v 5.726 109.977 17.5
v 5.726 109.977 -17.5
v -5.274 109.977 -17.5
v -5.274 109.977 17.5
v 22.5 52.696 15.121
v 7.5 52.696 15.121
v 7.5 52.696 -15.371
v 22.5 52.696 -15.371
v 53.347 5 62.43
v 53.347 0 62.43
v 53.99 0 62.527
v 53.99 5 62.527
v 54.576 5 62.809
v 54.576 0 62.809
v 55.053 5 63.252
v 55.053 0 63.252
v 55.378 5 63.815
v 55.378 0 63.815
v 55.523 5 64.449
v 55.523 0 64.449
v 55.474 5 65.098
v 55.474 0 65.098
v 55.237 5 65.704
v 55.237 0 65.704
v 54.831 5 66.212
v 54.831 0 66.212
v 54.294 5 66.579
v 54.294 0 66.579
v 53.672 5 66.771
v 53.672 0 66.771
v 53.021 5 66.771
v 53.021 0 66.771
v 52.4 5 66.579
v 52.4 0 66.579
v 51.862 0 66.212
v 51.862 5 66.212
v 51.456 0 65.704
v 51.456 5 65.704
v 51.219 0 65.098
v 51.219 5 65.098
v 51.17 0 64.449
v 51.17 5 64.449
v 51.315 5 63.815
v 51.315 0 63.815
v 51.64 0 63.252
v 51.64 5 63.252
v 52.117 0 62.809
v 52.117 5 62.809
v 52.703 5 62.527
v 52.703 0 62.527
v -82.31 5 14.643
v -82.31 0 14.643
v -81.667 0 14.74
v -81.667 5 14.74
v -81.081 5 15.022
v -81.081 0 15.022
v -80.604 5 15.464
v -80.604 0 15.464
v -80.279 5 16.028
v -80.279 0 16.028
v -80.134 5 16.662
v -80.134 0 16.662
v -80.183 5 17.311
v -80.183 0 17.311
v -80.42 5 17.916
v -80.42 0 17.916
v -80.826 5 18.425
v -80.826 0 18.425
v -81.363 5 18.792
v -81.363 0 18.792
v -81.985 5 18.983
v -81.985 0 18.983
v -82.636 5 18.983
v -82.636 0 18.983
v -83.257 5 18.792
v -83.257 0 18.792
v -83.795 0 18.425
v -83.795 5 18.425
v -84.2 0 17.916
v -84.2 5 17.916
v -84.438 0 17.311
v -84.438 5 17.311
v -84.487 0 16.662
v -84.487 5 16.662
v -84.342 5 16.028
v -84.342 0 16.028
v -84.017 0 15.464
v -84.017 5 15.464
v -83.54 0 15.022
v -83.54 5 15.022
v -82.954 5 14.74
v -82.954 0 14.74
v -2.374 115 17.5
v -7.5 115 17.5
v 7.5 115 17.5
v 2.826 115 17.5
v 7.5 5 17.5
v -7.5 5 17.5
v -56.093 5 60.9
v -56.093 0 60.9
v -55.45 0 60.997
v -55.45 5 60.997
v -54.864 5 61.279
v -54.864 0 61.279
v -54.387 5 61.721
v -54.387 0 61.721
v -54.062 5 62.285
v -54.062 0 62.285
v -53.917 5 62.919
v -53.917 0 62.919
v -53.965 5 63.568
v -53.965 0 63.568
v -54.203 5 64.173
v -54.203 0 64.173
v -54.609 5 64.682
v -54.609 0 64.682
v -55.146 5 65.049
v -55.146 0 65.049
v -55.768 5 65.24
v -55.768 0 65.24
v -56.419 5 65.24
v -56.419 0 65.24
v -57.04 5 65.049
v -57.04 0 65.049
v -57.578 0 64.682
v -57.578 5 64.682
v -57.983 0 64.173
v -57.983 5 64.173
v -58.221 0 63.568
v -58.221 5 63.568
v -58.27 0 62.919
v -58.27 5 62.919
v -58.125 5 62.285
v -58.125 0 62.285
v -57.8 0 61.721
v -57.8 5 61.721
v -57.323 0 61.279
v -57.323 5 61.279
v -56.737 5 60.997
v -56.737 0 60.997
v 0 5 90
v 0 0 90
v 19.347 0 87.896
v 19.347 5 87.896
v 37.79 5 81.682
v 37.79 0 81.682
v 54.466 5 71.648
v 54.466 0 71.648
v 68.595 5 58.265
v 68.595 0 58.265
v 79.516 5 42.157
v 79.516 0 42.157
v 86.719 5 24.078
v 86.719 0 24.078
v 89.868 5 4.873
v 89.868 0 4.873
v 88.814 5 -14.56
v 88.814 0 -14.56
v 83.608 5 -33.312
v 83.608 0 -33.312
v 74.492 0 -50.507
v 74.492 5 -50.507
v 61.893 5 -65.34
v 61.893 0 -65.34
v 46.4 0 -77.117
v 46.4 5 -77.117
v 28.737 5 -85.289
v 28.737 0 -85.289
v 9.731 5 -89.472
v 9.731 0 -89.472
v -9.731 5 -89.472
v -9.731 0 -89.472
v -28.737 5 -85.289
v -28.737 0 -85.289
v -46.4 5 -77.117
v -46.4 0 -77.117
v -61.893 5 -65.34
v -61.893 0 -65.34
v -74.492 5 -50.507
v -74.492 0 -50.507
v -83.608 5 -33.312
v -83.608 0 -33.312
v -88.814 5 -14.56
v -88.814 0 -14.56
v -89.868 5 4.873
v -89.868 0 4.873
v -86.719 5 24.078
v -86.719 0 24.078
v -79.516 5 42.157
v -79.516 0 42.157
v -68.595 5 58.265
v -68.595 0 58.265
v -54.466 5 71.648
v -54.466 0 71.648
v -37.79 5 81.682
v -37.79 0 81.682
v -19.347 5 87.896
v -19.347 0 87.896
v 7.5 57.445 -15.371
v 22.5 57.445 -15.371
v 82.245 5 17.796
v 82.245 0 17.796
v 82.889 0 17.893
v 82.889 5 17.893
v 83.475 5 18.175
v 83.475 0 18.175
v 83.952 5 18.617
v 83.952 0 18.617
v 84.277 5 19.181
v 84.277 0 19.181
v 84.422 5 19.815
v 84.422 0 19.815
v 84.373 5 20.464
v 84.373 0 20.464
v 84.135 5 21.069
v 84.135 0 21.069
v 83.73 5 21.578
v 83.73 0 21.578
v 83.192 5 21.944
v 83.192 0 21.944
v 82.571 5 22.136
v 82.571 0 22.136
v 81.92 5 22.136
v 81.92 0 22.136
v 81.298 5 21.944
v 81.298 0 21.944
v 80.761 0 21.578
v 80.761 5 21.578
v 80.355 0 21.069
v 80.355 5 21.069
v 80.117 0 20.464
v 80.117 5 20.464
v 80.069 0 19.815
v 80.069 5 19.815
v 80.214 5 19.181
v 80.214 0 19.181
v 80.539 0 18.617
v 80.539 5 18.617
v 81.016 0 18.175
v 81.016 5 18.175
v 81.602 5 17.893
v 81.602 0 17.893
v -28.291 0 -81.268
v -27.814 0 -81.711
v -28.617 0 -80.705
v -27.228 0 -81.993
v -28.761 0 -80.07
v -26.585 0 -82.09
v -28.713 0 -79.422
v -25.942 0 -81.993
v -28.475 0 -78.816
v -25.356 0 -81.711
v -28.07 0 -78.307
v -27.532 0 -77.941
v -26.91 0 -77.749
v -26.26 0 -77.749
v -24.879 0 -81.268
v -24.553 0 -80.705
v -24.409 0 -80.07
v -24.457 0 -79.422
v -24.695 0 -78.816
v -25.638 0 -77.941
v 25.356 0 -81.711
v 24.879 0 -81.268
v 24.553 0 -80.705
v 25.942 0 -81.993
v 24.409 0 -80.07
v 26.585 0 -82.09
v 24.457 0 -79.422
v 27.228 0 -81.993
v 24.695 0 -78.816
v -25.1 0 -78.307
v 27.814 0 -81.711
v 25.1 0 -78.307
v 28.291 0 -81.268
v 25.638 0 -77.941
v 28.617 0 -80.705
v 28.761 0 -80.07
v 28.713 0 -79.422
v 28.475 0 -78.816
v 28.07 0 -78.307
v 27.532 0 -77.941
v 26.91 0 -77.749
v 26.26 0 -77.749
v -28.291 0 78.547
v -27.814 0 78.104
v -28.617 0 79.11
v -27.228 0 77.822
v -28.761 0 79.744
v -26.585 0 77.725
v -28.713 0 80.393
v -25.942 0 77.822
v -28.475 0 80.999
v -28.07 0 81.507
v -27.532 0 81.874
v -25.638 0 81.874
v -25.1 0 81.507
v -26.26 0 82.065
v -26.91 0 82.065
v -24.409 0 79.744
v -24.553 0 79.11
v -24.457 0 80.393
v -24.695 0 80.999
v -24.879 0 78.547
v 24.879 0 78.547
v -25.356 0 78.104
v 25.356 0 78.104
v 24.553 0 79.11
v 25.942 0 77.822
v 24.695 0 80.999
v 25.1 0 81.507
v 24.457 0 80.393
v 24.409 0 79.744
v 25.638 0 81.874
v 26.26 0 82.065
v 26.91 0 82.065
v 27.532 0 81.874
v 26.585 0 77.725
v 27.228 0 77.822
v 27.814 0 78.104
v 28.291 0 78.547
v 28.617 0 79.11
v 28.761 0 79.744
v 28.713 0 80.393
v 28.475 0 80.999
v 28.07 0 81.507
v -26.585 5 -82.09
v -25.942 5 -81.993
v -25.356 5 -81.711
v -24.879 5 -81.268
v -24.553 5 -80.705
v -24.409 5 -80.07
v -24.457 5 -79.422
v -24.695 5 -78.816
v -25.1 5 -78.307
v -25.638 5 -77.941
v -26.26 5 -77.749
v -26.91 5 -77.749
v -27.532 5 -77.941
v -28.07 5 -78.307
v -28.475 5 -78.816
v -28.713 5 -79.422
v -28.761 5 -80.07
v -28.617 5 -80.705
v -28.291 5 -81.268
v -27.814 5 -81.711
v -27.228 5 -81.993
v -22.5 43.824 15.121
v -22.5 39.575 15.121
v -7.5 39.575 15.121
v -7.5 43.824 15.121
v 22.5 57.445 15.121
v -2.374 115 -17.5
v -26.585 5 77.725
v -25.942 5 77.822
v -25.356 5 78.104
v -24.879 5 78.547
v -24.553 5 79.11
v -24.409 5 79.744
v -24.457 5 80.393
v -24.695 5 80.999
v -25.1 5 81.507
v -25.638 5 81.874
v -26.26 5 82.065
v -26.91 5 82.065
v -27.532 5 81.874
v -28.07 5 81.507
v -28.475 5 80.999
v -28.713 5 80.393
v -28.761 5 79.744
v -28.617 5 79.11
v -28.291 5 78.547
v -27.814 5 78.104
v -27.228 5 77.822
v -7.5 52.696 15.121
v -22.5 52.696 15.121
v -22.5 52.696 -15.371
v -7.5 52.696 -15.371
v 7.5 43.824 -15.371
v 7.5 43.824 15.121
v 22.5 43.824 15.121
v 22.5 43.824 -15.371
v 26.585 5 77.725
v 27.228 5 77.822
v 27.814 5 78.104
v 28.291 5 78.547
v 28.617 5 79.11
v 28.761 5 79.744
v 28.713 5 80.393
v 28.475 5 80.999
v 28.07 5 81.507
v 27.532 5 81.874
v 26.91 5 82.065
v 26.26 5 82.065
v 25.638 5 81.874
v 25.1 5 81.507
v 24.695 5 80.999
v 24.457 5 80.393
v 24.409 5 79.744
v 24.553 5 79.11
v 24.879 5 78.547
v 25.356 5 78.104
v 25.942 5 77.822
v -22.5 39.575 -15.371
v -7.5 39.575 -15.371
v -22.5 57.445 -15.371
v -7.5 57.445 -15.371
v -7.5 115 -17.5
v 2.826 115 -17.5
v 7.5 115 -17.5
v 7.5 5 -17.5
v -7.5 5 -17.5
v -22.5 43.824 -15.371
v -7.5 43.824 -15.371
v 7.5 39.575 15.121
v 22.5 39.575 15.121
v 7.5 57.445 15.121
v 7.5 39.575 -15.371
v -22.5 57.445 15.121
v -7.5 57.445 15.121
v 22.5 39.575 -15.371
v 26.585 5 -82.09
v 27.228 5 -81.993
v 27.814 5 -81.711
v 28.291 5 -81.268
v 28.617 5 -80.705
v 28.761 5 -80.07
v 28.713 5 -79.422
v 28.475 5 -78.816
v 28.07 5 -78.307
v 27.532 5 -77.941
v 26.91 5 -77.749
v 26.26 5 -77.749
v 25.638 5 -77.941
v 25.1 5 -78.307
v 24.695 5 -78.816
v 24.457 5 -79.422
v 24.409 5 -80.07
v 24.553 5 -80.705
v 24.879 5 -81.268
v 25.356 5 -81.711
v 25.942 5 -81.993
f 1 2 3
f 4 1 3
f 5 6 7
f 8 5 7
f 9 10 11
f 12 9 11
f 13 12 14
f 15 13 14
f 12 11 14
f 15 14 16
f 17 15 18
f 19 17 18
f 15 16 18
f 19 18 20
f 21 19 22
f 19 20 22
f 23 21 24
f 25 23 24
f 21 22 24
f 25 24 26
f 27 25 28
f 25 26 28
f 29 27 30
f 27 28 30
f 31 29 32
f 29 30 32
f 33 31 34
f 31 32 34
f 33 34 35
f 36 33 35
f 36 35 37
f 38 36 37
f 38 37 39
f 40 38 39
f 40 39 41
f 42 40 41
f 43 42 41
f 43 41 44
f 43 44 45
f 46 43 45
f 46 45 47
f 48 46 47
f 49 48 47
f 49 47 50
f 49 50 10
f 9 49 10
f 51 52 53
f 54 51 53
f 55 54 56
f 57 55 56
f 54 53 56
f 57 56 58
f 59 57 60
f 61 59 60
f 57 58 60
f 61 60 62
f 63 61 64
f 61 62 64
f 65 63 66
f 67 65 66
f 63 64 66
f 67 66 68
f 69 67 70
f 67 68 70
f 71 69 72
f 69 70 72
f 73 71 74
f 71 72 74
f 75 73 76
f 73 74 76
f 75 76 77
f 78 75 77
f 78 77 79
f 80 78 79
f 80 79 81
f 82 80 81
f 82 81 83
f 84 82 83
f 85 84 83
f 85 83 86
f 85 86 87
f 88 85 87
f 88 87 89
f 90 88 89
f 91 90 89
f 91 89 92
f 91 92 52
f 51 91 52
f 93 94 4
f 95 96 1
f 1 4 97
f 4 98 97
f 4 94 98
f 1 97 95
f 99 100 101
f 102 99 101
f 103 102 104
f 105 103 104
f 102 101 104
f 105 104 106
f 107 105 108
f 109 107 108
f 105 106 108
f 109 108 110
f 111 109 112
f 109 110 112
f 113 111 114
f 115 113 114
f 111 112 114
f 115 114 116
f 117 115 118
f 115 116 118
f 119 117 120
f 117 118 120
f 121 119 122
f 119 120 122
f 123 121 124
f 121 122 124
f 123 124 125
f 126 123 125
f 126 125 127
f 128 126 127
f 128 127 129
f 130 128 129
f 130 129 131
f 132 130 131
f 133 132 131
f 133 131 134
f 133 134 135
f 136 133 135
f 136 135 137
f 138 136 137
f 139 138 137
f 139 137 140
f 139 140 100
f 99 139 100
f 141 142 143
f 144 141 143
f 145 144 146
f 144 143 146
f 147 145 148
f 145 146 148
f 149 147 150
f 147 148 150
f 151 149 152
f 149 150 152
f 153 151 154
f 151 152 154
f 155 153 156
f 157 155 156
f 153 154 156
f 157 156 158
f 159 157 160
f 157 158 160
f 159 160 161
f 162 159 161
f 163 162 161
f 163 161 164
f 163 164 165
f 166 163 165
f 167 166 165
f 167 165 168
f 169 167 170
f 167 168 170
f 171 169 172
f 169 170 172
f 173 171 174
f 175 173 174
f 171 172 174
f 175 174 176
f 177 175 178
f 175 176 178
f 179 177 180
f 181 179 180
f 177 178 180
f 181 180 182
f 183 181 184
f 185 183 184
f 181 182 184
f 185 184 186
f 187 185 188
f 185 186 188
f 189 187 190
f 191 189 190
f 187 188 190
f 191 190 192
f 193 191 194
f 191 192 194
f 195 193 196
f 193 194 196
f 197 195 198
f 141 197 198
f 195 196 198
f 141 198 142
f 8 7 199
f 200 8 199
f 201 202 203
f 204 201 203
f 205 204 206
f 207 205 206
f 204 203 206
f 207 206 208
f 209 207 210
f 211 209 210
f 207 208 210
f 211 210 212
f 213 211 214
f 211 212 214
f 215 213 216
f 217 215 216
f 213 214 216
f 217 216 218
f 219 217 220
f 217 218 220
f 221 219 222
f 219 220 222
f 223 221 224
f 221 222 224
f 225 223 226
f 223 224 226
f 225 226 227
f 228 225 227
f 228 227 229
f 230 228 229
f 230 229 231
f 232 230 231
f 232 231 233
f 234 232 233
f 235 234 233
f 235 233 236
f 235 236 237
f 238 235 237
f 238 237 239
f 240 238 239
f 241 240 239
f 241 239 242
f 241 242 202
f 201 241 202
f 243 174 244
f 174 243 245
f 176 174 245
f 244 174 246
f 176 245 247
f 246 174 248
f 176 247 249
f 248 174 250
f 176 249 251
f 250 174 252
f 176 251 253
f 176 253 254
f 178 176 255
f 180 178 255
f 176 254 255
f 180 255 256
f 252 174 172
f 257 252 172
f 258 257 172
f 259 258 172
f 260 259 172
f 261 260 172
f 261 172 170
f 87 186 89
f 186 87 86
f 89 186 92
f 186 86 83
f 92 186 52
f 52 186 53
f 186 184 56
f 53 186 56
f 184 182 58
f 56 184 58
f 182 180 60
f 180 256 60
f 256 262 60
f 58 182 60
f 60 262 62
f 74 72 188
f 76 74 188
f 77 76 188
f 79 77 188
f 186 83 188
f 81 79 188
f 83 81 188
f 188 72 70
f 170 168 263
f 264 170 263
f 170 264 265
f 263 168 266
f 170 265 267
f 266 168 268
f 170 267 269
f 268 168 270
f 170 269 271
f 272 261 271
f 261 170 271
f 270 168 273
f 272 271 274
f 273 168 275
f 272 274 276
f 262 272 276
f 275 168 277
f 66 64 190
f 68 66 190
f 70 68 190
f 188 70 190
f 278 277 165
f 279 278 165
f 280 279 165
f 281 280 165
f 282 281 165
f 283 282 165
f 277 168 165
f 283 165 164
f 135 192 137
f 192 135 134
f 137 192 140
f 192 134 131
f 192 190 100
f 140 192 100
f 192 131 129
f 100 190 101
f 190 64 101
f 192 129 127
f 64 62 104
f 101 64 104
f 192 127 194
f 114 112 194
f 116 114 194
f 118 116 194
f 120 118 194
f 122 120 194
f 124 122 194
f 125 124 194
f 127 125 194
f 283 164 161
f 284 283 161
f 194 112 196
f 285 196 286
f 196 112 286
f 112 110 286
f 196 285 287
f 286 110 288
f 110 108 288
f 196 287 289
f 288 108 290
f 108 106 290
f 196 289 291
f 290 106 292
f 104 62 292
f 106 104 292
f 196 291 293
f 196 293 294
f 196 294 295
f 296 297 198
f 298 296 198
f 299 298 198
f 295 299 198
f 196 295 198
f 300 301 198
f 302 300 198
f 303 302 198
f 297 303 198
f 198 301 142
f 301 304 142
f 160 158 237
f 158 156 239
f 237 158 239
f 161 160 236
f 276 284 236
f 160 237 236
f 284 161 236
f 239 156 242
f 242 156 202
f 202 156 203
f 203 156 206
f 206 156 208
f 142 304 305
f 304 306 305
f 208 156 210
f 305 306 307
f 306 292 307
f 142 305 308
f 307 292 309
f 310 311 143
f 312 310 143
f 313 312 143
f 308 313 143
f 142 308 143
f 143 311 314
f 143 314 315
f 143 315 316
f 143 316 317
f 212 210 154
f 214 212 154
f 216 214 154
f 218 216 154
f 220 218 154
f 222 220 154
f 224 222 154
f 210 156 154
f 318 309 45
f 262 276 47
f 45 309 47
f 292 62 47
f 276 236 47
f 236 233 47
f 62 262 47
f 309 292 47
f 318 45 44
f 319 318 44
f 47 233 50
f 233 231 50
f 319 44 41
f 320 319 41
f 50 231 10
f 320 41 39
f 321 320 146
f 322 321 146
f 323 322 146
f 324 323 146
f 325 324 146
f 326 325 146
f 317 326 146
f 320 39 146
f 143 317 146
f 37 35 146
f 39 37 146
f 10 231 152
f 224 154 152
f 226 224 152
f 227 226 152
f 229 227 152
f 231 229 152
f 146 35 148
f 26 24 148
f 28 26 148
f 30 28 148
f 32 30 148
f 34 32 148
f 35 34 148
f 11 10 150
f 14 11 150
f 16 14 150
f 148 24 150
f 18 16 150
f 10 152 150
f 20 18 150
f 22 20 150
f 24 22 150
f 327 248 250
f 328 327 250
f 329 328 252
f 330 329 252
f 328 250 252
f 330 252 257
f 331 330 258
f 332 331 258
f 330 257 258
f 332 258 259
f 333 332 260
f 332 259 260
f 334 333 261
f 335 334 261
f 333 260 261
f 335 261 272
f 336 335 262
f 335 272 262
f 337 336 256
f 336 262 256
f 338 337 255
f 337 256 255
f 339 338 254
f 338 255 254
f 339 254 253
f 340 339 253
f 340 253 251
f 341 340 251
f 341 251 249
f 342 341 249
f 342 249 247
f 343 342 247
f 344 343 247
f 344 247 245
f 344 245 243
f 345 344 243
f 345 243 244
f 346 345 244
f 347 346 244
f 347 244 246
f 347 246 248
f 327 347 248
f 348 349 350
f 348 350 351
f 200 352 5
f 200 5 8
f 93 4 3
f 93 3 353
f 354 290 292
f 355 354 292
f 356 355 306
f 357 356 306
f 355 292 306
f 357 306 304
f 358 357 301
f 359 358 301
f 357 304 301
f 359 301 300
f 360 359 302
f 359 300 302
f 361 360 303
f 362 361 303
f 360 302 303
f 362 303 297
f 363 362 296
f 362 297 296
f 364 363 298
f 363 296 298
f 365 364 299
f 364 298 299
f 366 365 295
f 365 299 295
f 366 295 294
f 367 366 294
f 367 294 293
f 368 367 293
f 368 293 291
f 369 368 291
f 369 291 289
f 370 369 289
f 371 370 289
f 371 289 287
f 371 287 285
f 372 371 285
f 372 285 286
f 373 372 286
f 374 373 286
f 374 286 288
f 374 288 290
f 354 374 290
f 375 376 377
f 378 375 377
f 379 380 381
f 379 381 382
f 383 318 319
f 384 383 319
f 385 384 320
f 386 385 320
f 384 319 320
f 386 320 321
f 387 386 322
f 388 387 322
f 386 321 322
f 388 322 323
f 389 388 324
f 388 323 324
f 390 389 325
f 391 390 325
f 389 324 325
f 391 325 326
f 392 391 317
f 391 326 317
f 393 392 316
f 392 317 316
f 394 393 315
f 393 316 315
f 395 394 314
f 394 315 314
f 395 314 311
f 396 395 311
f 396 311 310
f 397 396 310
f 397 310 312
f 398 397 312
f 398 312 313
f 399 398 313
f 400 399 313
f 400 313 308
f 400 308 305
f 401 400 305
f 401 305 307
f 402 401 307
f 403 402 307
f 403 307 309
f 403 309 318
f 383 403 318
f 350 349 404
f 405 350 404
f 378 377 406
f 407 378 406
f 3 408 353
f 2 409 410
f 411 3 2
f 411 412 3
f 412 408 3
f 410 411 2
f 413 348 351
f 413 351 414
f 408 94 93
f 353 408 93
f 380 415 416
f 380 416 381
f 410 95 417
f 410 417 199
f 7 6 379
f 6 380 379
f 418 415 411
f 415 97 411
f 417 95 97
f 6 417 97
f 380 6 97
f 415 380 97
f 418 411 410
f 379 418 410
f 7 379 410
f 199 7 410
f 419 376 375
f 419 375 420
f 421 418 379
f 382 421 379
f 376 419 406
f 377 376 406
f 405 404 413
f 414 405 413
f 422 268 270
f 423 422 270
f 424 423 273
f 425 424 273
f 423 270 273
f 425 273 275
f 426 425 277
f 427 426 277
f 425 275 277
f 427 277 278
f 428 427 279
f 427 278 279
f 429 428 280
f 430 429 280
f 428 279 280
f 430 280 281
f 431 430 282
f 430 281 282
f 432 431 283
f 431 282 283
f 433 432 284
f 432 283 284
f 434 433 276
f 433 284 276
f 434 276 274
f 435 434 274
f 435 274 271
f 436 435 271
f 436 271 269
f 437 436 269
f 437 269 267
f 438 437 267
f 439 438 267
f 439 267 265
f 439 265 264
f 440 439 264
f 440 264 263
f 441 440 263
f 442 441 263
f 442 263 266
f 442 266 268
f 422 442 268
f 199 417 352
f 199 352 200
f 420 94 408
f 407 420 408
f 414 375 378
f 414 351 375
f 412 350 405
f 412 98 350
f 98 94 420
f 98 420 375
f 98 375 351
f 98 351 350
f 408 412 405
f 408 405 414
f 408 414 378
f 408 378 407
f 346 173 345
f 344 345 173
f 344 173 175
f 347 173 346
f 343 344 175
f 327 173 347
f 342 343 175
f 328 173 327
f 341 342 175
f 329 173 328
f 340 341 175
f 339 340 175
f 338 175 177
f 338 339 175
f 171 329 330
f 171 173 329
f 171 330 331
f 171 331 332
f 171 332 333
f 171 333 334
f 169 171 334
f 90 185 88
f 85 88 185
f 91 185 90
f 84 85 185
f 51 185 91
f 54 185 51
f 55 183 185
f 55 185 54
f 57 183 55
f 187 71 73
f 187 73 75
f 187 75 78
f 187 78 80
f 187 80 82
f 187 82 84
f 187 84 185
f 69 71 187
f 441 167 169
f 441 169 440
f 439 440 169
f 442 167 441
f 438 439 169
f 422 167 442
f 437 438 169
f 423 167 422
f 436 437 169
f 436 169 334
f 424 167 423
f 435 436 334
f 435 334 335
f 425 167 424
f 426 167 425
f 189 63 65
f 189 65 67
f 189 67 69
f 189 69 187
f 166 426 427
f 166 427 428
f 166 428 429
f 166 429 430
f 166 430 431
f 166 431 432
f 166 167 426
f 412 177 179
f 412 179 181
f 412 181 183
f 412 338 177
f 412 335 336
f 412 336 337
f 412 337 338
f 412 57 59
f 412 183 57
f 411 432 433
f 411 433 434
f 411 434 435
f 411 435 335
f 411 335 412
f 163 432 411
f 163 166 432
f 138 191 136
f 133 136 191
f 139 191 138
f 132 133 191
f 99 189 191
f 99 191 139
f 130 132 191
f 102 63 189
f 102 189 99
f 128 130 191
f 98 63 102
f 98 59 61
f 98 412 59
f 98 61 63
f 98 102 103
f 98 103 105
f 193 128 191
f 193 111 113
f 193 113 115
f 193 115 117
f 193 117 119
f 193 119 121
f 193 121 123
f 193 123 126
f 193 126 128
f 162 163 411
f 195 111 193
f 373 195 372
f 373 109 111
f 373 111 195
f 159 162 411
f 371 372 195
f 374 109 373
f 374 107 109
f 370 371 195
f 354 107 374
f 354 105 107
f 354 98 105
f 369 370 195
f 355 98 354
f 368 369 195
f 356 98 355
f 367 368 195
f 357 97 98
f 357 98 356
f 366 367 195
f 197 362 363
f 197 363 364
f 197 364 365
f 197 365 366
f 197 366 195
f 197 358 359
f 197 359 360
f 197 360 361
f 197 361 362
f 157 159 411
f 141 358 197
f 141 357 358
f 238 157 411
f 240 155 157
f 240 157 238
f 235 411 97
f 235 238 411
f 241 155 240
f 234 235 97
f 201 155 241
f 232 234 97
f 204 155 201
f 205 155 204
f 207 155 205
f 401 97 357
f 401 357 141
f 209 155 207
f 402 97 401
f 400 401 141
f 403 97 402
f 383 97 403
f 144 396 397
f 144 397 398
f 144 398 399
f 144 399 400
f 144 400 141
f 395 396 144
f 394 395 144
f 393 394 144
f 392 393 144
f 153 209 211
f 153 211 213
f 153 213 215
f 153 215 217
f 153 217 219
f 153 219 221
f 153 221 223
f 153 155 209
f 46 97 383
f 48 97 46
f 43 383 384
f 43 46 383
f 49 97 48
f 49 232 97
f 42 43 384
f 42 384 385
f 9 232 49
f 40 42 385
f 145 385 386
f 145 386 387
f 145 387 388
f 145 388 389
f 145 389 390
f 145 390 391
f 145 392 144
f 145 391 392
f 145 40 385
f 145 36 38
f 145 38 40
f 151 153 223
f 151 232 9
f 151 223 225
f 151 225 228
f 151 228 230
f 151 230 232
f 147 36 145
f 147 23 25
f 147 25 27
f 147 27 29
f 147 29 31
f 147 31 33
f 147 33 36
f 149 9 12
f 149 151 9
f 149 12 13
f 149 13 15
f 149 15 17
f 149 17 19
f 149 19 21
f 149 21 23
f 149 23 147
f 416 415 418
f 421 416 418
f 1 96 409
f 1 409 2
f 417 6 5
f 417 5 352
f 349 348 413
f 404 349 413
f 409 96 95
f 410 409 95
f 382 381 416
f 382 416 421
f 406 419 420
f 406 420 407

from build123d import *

# Parameters (mm, degrees)
SKETCH1_R                = 90
BOSS_EXTRUDE1_DEPTH      = 5
SKETCH2_W                = 15
SKETCH2_H                = 35
BOSS_EXTRUDE2_DEPTH      = 110
CUT_EXTRUDE1_DEPTH       = 36
SKETCH4_R                = 2.18255
CUT_EXTRUDE2_DEPTH       = 62
BOSS_EXTRUDE4_DEPTH      = 15
BOSS_EXTRUDE4_DEPTH_BACK = 30
SKETCH6_W                = 30.491916349
SKETCH6_H                = 4.74874107
SKETCH6_H_2              = 4.248873589


with BuildPart() as part:
    # Sketch1 → Boss-Extrude1 (new body)
    with BuildSketch(Plane(origin=(0, 0, 0), x_dir=(1, 0, 0), z_dir=(0, 1, 0))):
        with Locations(Location((0, 0, 0), (0, 0, 270))):
            Circle(SKETCH1_R)
    extrude(amount=BOSS_EXTRUDE1_DEPTH)

    # Sketch2 → Boss-Extrude2 (add)
    with BuildSketch(Plane(origin=(0, 5, 0), x_dir=(1, 0, 0), z_dir=(0, 1, 0))):
        Rectangle(SKETCH2_W, SKETCH2_H)
    extrude(amount=BOSS_EXTRUDE2_DEPTH)

    # Sketch3 → Cut-Extrude1 (cut)
    with BuildSketch(Plane.XY.offset(17.5)):
        Polygon((-2.373551685, 115), (2.826448315, 115), (5.726448315, 109.977052658), (-5.273551685, 109.977052658), align=None)
    extrude(amount=-CUT_EXTRUDE1_DEPTH, mode=Mode.SUBTRACT)

    # Sketch4 → Cut-Extrude2 (cut)
    with BuildSketch(Plane(origin=(0, 0, 0), x_dir=(-1, 0, 0), z_dir=(0, -1, 0))):
        with Locations(Location((-26.585, 79.907325251, 0), (0, 0, 90))):
            Circle(SKETCH4_R)
        with Locations(Location((26.585, 79.907325251, 0), (0, 0, 90))):
            Circle(SKETCH4_R)
        with Locations(Location((82.310329065, -16.825152102, 0), (0, 0, 90))):
            Circle(SKETCH4_R)
        with Locations(Location((56.093218167, -63.082173149, 0), (0, 0, 90))):
            Circle(SKETCH4_R)
        with Locations(Location((26.585, -79.907325251, 0), (0, 0, 90))):
            Circle(SKETCH4_R)
        with Locations(Location((-26.585, -79.907325251, 0), (0, 0, 90))):
            Circle(SKETCH4_R)
        with Locations(Location((-53.346563788, -64.612502947, 0), (0, 0, 90))):
            Circle(SKETCH4_R)
        with Locations(Location((-82.245302282, -19.978089739, 0), (0, 0, 90))):
            Circle(SKETCH4_R)
    extrude(amount=-CUT_EXTRUDE2_DEPTH, mode=Mode.SUBTRACT)

    # Sketch6 → Boss-Extrude4 (add, two sides: drawn at the far end of the back side and taken through both)
    with BuildSketch(Plane(origin=(7.5, 0, 0), x_dir=(0, 0, -1), z_dir=(1, 0, 0)).offset(-BOSS_EXTRUDE4_DEPTH_BACK)):
        with Locations((0.124966871, 55.070581362)):
            Rectangle(SKETCH6_W, SKETCH6_H)
        with Locations((0.124966871, 41.699126242)):
            Rectangle(SKETCH6_W, SKETCH6_H_2)
    extrude(amount=BOSS_EXTRUDE4_DEPTH + BOSS_EXTRUDE4_DEPTH_BACK)


solid = part.part
